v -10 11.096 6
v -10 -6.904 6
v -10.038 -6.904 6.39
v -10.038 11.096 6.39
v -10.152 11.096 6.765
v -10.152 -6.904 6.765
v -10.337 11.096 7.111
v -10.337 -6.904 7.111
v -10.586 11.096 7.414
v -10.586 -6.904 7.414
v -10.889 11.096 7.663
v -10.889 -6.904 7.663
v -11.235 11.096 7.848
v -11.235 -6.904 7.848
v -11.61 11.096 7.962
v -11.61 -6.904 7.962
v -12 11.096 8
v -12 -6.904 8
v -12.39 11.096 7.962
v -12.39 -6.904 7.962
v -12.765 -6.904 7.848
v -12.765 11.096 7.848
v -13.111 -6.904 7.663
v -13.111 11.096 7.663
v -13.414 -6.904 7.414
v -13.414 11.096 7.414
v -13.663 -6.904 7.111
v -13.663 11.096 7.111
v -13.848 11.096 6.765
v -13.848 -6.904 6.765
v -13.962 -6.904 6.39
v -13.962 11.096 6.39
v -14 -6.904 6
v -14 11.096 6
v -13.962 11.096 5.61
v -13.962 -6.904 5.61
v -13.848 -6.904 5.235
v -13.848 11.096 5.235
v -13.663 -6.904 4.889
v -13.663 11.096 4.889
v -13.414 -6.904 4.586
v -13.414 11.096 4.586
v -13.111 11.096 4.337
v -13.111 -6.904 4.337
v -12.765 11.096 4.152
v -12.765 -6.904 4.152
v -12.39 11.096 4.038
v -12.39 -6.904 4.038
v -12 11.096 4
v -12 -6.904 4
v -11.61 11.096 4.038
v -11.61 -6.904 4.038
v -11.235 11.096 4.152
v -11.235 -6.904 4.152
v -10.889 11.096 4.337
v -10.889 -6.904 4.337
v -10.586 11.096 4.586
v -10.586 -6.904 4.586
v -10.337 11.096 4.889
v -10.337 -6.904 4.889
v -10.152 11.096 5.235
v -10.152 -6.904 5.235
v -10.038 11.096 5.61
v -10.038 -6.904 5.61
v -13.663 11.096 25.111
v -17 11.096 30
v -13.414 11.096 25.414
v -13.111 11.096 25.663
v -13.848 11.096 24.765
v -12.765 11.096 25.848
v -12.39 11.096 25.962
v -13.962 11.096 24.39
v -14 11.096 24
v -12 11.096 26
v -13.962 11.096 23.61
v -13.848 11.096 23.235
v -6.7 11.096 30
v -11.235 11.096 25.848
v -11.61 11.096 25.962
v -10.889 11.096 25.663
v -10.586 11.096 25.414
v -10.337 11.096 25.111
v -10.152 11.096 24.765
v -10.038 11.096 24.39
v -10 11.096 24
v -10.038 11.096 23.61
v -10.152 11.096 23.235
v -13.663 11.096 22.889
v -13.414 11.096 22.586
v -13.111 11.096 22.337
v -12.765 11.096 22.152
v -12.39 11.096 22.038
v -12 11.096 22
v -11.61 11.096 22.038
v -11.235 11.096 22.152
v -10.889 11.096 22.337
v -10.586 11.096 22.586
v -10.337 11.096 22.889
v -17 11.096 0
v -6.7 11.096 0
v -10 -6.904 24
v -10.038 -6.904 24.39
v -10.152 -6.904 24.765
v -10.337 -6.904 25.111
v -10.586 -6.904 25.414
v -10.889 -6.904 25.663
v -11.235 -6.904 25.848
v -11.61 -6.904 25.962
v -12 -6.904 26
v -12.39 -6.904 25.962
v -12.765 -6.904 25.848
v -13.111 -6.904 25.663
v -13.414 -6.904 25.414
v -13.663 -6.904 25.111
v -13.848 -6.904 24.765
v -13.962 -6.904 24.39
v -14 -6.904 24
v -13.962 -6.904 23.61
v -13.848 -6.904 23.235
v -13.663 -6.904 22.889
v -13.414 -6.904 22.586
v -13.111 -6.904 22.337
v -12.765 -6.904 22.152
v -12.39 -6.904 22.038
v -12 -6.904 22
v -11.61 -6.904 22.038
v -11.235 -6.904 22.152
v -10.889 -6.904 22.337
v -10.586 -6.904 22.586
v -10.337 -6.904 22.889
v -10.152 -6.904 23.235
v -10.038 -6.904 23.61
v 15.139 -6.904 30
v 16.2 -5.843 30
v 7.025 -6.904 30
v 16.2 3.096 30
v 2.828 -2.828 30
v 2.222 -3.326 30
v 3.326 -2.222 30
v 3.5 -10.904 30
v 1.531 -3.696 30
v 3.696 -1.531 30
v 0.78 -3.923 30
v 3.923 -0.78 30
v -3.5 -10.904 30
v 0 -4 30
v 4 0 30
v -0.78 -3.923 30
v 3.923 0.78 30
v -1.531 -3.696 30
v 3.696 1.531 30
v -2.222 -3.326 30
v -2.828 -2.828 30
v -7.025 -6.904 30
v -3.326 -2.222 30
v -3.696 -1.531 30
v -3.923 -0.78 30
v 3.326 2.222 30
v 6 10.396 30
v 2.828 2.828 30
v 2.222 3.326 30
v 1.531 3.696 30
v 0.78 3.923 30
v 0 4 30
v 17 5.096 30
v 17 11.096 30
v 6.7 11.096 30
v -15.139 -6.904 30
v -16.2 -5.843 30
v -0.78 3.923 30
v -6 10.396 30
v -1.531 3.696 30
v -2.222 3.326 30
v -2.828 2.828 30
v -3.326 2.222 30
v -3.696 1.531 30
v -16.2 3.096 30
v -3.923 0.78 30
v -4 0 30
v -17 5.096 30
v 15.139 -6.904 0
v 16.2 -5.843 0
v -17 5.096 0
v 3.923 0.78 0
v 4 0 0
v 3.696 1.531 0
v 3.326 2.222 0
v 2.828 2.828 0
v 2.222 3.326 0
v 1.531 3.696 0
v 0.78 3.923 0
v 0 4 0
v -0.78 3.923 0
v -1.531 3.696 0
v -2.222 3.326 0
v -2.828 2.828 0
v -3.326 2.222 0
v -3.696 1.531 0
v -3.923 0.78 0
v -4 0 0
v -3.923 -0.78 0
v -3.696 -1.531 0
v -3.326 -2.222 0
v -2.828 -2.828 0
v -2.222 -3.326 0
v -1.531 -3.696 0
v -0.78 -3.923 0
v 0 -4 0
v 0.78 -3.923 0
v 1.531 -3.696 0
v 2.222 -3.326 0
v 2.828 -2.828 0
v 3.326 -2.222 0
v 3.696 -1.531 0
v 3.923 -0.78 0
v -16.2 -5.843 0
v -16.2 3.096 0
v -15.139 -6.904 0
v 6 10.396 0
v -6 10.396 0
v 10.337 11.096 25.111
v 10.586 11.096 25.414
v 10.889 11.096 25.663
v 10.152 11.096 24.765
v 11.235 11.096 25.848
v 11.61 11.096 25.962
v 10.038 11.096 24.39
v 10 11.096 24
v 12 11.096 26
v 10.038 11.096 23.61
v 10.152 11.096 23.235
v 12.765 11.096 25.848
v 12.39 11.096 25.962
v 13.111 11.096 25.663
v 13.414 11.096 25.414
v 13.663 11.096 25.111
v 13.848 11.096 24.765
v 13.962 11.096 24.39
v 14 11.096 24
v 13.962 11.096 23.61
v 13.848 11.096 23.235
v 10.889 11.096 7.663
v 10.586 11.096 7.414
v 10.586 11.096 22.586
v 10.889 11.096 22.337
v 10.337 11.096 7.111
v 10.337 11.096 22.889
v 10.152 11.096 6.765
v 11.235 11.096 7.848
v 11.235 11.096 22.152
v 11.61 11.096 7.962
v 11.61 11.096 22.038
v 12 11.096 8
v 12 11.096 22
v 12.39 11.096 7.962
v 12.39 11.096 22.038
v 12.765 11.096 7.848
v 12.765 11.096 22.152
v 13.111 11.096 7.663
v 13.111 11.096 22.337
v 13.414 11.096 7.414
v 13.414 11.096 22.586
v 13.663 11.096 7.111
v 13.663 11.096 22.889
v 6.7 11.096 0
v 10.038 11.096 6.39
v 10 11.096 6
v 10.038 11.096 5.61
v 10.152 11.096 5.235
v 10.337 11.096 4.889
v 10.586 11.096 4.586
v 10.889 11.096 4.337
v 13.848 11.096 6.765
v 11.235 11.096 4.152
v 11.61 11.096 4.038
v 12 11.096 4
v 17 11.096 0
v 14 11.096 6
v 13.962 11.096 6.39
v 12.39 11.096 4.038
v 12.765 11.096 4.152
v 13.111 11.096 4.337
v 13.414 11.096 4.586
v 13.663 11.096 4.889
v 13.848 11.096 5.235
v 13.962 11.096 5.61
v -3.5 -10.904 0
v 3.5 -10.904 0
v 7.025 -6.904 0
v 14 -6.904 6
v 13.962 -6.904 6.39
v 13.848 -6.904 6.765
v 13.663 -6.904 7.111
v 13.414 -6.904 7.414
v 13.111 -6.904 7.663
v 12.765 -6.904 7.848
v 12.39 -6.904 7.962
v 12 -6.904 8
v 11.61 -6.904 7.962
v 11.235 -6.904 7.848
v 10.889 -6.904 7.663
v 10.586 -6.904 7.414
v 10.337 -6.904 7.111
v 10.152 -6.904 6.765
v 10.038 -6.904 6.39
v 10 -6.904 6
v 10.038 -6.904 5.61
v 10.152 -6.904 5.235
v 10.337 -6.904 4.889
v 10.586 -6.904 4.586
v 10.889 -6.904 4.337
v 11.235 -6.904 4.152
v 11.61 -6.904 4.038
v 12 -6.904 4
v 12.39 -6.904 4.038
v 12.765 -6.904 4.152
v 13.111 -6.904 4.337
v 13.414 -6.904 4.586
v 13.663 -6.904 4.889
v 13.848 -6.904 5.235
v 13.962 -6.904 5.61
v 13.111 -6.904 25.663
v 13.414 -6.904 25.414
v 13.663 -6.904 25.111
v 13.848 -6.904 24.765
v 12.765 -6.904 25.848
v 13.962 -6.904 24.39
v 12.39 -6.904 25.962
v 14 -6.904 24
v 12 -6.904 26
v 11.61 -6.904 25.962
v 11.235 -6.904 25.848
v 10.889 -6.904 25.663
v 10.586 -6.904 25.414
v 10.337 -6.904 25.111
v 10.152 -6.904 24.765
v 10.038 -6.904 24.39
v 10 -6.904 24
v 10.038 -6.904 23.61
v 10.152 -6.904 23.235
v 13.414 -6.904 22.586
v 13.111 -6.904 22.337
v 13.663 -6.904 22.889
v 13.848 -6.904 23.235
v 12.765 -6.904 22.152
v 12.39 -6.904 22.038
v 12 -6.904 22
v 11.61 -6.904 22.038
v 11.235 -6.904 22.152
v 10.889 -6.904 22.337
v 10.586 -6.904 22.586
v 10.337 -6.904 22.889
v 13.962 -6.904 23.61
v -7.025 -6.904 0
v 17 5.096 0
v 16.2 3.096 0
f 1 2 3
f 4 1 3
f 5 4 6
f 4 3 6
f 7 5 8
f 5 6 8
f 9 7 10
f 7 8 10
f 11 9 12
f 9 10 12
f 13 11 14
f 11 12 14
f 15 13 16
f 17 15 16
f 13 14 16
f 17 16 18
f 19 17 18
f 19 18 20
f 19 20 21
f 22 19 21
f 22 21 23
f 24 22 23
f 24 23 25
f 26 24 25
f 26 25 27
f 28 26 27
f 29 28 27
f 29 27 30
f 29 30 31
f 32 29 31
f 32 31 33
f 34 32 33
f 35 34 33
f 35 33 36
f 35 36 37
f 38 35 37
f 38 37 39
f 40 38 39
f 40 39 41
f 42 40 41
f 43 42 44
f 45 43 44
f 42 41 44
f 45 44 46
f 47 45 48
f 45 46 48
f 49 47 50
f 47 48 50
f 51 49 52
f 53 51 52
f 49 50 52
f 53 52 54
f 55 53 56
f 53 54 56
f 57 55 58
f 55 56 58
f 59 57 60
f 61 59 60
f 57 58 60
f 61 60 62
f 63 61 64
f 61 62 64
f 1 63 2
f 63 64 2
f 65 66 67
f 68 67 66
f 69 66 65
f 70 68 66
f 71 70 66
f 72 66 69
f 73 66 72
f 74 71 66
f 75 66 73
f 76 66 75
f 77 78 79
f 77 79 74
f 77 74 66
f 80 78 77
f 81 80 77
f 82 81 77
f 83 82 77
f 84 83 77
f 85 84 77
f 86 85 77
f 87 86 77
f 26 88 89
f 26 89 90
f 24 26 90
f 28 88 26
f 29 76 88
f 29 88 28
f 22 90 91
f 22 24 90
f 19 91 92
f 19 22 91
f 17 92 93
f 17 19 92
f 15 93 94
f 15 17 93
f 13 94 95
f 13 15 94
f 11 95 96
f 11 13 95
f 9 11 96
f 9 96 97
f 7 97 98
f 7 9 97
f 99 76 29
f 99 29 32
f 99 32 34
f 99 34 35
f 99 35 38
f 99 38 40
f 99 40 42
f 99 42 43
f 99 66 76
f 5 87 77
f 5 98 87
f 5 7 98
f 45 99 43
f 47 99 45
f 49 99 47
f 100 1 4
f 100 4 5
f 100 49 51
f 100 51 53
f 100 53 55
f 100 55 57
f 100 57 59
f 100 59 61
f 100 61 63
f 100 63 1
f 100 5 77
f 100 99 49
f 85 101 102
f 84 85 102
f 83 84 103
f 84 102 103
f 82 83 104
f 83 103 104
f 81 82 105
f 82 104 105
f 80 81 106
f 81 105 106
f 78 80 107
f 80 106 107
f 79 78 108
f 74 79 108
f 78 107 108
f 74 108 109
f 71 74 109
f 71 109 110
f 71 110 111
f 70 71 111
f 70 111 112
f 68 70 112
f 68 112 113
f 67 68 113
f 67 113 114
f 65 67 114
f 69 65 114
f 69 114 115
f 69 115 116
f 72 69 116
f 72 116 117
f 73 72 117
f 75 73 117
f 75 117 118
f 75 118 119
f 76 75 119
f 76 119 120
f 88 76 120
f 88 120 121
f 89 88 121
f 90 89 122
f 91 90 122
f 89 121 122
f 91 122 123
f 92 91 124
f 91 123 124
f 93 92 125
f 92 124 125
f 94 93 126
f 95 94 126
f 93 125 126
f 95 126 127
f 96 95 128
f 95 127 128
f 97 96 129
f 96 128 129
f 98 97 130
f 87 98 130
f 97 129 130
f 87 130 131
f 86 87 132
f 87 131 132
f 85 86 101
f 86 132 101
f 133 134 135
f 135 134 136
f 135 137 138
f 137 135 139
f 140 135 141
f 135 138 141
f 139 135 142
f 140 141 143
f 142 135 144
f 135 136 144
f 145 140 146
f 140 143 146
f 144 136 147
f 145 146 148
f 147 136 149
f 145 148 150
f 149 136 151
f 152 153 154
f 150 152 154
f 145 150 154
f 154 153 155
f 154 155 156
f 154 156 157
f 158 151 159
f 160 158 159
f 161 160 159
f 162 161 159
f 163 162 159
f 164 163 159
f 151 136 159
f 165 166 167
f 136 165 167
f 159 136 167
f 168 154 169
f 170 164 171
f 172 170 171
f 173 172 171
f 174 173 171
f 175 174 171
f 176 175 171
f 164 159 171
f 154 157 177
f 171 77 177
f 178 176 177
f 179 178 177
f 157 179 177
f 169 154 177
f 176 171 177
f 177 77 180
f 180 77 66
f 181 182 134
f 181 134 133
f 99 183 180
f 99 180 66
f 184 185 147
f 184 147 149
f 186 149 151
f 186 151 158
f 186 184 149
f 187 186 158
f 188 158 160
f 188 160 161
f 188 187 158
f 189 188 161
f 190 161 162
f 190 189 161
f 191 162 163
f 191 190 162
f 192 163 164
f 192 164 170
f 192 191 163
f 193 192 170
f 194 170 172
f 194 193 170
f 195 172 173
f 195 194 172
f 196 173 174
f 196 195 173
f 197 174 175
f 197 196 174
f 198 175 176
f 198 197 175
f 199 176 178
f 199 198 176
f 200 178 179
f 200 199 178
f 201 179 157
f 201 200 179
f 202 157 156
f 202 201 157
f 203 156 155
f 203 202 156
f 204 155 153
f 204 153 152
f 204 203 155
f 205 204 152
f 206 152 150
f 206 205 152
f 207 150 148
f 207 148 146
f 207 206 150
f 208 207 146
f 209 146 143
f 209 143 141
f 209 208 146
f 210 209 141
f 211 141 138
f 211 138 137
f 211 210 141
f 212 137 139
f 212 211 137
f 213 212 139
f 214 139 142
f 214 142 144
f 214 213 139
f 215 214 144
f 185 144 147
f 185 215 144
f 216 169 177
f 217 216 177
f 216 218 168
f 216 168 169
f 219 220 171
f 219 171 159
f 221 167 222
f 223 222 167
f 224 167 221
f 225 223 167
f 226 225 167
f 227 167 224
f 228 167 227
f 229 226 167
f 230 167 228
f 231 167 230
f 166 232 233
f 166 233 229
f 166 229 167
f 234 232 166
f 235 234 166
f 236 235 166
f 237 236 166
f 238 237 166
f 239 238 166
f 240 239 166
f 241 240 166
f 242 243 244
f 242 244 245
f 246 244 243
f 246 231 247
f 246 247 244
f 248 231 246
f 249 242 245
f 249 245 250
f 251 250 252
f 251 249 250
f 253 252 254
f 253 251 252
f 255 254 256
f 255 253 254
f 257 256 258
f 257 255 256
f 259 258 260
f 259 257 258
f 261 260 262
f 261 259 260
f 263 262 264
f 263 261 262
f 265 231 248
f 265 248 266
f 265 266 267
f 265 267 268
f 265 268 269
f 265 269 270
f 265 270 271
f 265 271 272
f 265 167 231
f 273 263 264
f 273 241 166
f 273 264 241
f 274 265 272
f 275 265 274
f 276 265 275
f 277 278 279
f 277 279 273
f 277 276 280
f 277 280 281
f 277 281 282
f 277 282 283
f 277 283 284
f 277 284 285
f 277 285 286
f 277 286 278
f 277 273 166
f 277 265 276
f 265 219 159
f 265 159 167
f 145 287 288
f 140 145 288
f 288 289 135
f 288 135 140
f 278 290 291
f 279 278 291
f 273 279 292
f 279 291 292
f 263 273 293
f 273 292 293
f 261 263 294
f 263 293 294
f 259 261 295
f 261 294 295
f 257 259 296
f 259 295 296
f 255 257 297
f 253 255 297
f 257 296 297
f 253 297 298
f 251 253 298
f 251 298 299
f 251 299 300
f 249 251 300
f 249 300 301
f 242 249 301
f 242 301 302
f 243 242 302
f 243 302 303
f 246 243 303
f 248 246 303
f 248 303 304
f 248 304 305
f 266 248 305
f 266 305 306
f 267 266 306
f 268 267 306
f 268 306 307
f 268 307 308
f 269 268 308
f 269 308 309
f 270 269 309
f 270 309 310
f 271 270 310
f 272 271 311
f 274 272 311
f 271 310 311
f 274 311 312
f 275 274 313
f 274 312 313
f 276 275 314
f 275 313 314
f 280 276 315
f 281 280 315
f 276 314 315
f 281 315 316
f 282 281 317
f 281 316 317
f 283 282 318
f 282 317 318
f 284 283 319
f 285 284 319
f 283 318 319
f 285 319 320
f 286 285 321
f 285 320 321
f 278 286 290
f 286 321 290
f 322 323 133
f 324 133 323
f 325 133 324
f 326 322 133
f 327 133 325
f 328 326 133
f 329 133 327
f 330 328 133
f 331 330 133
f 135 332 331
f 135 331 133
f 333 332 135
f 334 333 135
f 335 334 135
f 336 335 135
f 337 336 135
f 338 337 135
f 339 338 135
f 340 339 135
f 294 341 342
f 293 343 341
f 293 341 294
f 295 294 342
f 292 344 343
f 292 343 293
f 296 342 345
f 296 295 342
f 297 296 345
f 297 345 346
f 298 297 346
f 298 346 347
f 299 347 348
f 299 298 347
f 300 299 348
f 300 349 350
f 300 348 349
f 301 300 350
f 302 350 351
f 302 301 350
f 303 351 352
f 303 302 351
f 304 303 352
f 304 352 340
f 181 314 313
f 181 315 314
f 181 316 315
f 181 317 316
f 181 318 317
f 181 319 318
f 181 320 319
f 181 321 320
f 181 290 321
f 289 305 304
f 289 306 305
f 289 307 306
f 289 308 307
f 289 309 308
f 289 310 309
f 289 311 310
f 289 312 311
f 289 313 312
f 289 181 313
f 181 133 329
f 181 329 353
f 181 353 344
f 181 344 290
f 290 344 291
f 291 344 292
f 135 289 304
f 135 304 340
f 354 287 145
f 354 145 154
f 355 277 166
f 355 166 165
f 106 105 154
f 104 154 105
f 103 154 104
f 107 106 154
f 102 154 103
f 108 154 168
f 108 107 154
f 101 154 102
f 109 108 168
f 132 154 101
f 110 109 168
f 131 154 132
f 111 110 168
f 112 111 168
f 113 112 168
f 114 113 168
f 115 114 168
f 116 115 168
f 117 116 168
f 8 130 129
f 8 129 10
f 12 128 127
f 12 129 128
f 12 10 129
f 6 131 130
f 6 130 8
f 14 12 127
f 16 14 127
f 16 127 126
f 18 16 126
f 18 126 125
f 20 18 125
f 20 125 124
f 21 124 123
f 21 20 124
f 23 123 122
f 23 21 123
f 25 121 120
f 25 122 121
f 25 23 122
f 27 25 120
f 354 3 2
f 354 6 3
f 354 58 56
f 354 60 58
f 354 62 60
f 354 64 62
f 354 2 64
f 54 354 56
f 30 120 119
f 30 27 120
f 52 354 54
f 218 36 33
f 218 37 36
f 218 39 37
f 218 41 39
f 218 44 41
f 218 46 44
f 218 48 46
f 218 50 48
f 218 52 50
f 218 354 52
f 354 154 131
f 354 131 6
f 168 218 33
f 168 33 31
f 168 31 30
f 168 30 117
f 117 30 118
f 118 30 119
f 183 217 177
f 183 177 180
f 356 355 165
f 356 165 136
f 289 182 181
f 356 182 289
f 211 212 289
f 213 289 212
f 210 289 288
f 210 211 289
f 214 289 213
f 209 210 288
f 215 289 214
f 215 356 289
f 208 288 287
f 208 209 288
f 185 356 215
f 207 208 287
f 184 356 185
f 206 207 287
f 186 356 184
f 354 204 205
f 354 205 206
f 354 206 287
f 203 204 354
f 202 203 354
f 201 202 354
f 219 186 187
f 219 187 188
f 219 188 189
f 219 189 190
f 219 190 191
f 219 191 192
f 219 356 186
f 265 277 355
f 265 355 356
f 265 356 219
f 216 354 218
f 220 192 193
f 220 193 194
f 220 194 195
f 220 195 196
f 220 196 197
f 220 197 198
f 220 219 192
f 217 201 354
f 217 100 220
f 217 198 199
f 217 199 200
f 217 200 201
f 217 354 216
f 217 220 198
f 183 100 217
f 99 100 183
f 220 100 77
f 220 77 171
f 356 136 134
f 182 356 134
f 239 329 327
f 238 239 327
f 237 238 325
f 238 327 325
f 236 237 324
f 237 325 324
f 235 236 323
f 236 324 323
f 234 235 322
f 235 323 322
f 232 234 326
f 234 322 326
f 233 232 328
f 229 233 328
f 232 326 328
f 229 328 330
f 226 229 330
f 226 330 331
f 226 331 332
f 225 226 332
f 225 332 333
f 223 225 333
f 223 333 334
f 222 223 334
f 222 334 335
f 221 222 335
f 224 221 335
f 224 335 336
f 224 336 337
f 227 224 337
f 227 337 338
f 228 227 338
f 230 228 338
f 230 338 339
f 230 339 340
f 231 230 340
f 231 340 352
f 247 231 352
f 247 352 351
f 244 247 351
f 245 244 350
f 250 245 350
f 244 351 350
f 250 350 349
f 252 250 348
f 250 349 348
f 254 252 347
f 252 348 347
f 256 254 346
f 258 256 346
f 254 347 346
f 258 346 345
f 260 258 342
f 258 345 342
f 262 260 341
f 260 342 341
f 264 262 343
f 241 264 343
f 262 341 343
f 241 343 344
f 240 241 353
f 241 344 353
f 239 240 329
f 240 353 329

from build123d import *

# Parameters (mm, degrees)
SKETCH1_R           = 7.5
SKETCH1_R_2         = 4
BOSS_EXTRUDE1_DEPTH = 30
SKETCH4_R           = 2
CUT_EXTRUDE1_DEPTH  = 19


with BuildPart() as part:
    # Sketch1 → Boss-Extrude1 (new body)
    with BuildSketch(Plane.XY):
        Polygon((6.7, 11.09607963), (17, 11.09607963), (17, 5.09607963), (16.2, 3.09607963), (16.2, -5.843260198), (15.139339828, -6.90392037), (7.024607597, -6.90392037), (3.5, -10.90392037), (0, -10.90392037), (-3.5, -10.90392037), (-7.024607597, -6.90392037), (-15.139339828, -6.90392037), (-16.2, -5.843260198), (-16.2, 3.09607963), (-17, 5.09607963), (-17, 11.09607963), (-6.7, 11.09607963), (-6, 10.39607963), (6, 10.39607963), align=None)
        Circle(SKETCH1_R, mode=Mode.SUBTRACT)
        Circle(SKETCH1_R)
        Circle(SKETCH1_R_2, mode=Mode.SUBTRACT)
    extrude(amount=BOSS_EXTRUDE1_DEPTH)

    # Sketch4 → Cut-Extrude1 (cut, through all)
    with BuildSketch(Plane.XZ.offset(6.90392037)):
        with Locations((-12, 24)):
            Circle(SKETCH4_R)
        with Locations((-12, 6)):
            Circle(SKETCH4_R)
        with Locations((12, 6)):
            Circle(SKETCH4_R)
        with Locations((12, 24)):
            Circle(SKETCH4_R)
    extrude(amount=-CUT_EXTRUDE1_DEPTH, mode=Mode.SUBTRACT)


solid = part.part
